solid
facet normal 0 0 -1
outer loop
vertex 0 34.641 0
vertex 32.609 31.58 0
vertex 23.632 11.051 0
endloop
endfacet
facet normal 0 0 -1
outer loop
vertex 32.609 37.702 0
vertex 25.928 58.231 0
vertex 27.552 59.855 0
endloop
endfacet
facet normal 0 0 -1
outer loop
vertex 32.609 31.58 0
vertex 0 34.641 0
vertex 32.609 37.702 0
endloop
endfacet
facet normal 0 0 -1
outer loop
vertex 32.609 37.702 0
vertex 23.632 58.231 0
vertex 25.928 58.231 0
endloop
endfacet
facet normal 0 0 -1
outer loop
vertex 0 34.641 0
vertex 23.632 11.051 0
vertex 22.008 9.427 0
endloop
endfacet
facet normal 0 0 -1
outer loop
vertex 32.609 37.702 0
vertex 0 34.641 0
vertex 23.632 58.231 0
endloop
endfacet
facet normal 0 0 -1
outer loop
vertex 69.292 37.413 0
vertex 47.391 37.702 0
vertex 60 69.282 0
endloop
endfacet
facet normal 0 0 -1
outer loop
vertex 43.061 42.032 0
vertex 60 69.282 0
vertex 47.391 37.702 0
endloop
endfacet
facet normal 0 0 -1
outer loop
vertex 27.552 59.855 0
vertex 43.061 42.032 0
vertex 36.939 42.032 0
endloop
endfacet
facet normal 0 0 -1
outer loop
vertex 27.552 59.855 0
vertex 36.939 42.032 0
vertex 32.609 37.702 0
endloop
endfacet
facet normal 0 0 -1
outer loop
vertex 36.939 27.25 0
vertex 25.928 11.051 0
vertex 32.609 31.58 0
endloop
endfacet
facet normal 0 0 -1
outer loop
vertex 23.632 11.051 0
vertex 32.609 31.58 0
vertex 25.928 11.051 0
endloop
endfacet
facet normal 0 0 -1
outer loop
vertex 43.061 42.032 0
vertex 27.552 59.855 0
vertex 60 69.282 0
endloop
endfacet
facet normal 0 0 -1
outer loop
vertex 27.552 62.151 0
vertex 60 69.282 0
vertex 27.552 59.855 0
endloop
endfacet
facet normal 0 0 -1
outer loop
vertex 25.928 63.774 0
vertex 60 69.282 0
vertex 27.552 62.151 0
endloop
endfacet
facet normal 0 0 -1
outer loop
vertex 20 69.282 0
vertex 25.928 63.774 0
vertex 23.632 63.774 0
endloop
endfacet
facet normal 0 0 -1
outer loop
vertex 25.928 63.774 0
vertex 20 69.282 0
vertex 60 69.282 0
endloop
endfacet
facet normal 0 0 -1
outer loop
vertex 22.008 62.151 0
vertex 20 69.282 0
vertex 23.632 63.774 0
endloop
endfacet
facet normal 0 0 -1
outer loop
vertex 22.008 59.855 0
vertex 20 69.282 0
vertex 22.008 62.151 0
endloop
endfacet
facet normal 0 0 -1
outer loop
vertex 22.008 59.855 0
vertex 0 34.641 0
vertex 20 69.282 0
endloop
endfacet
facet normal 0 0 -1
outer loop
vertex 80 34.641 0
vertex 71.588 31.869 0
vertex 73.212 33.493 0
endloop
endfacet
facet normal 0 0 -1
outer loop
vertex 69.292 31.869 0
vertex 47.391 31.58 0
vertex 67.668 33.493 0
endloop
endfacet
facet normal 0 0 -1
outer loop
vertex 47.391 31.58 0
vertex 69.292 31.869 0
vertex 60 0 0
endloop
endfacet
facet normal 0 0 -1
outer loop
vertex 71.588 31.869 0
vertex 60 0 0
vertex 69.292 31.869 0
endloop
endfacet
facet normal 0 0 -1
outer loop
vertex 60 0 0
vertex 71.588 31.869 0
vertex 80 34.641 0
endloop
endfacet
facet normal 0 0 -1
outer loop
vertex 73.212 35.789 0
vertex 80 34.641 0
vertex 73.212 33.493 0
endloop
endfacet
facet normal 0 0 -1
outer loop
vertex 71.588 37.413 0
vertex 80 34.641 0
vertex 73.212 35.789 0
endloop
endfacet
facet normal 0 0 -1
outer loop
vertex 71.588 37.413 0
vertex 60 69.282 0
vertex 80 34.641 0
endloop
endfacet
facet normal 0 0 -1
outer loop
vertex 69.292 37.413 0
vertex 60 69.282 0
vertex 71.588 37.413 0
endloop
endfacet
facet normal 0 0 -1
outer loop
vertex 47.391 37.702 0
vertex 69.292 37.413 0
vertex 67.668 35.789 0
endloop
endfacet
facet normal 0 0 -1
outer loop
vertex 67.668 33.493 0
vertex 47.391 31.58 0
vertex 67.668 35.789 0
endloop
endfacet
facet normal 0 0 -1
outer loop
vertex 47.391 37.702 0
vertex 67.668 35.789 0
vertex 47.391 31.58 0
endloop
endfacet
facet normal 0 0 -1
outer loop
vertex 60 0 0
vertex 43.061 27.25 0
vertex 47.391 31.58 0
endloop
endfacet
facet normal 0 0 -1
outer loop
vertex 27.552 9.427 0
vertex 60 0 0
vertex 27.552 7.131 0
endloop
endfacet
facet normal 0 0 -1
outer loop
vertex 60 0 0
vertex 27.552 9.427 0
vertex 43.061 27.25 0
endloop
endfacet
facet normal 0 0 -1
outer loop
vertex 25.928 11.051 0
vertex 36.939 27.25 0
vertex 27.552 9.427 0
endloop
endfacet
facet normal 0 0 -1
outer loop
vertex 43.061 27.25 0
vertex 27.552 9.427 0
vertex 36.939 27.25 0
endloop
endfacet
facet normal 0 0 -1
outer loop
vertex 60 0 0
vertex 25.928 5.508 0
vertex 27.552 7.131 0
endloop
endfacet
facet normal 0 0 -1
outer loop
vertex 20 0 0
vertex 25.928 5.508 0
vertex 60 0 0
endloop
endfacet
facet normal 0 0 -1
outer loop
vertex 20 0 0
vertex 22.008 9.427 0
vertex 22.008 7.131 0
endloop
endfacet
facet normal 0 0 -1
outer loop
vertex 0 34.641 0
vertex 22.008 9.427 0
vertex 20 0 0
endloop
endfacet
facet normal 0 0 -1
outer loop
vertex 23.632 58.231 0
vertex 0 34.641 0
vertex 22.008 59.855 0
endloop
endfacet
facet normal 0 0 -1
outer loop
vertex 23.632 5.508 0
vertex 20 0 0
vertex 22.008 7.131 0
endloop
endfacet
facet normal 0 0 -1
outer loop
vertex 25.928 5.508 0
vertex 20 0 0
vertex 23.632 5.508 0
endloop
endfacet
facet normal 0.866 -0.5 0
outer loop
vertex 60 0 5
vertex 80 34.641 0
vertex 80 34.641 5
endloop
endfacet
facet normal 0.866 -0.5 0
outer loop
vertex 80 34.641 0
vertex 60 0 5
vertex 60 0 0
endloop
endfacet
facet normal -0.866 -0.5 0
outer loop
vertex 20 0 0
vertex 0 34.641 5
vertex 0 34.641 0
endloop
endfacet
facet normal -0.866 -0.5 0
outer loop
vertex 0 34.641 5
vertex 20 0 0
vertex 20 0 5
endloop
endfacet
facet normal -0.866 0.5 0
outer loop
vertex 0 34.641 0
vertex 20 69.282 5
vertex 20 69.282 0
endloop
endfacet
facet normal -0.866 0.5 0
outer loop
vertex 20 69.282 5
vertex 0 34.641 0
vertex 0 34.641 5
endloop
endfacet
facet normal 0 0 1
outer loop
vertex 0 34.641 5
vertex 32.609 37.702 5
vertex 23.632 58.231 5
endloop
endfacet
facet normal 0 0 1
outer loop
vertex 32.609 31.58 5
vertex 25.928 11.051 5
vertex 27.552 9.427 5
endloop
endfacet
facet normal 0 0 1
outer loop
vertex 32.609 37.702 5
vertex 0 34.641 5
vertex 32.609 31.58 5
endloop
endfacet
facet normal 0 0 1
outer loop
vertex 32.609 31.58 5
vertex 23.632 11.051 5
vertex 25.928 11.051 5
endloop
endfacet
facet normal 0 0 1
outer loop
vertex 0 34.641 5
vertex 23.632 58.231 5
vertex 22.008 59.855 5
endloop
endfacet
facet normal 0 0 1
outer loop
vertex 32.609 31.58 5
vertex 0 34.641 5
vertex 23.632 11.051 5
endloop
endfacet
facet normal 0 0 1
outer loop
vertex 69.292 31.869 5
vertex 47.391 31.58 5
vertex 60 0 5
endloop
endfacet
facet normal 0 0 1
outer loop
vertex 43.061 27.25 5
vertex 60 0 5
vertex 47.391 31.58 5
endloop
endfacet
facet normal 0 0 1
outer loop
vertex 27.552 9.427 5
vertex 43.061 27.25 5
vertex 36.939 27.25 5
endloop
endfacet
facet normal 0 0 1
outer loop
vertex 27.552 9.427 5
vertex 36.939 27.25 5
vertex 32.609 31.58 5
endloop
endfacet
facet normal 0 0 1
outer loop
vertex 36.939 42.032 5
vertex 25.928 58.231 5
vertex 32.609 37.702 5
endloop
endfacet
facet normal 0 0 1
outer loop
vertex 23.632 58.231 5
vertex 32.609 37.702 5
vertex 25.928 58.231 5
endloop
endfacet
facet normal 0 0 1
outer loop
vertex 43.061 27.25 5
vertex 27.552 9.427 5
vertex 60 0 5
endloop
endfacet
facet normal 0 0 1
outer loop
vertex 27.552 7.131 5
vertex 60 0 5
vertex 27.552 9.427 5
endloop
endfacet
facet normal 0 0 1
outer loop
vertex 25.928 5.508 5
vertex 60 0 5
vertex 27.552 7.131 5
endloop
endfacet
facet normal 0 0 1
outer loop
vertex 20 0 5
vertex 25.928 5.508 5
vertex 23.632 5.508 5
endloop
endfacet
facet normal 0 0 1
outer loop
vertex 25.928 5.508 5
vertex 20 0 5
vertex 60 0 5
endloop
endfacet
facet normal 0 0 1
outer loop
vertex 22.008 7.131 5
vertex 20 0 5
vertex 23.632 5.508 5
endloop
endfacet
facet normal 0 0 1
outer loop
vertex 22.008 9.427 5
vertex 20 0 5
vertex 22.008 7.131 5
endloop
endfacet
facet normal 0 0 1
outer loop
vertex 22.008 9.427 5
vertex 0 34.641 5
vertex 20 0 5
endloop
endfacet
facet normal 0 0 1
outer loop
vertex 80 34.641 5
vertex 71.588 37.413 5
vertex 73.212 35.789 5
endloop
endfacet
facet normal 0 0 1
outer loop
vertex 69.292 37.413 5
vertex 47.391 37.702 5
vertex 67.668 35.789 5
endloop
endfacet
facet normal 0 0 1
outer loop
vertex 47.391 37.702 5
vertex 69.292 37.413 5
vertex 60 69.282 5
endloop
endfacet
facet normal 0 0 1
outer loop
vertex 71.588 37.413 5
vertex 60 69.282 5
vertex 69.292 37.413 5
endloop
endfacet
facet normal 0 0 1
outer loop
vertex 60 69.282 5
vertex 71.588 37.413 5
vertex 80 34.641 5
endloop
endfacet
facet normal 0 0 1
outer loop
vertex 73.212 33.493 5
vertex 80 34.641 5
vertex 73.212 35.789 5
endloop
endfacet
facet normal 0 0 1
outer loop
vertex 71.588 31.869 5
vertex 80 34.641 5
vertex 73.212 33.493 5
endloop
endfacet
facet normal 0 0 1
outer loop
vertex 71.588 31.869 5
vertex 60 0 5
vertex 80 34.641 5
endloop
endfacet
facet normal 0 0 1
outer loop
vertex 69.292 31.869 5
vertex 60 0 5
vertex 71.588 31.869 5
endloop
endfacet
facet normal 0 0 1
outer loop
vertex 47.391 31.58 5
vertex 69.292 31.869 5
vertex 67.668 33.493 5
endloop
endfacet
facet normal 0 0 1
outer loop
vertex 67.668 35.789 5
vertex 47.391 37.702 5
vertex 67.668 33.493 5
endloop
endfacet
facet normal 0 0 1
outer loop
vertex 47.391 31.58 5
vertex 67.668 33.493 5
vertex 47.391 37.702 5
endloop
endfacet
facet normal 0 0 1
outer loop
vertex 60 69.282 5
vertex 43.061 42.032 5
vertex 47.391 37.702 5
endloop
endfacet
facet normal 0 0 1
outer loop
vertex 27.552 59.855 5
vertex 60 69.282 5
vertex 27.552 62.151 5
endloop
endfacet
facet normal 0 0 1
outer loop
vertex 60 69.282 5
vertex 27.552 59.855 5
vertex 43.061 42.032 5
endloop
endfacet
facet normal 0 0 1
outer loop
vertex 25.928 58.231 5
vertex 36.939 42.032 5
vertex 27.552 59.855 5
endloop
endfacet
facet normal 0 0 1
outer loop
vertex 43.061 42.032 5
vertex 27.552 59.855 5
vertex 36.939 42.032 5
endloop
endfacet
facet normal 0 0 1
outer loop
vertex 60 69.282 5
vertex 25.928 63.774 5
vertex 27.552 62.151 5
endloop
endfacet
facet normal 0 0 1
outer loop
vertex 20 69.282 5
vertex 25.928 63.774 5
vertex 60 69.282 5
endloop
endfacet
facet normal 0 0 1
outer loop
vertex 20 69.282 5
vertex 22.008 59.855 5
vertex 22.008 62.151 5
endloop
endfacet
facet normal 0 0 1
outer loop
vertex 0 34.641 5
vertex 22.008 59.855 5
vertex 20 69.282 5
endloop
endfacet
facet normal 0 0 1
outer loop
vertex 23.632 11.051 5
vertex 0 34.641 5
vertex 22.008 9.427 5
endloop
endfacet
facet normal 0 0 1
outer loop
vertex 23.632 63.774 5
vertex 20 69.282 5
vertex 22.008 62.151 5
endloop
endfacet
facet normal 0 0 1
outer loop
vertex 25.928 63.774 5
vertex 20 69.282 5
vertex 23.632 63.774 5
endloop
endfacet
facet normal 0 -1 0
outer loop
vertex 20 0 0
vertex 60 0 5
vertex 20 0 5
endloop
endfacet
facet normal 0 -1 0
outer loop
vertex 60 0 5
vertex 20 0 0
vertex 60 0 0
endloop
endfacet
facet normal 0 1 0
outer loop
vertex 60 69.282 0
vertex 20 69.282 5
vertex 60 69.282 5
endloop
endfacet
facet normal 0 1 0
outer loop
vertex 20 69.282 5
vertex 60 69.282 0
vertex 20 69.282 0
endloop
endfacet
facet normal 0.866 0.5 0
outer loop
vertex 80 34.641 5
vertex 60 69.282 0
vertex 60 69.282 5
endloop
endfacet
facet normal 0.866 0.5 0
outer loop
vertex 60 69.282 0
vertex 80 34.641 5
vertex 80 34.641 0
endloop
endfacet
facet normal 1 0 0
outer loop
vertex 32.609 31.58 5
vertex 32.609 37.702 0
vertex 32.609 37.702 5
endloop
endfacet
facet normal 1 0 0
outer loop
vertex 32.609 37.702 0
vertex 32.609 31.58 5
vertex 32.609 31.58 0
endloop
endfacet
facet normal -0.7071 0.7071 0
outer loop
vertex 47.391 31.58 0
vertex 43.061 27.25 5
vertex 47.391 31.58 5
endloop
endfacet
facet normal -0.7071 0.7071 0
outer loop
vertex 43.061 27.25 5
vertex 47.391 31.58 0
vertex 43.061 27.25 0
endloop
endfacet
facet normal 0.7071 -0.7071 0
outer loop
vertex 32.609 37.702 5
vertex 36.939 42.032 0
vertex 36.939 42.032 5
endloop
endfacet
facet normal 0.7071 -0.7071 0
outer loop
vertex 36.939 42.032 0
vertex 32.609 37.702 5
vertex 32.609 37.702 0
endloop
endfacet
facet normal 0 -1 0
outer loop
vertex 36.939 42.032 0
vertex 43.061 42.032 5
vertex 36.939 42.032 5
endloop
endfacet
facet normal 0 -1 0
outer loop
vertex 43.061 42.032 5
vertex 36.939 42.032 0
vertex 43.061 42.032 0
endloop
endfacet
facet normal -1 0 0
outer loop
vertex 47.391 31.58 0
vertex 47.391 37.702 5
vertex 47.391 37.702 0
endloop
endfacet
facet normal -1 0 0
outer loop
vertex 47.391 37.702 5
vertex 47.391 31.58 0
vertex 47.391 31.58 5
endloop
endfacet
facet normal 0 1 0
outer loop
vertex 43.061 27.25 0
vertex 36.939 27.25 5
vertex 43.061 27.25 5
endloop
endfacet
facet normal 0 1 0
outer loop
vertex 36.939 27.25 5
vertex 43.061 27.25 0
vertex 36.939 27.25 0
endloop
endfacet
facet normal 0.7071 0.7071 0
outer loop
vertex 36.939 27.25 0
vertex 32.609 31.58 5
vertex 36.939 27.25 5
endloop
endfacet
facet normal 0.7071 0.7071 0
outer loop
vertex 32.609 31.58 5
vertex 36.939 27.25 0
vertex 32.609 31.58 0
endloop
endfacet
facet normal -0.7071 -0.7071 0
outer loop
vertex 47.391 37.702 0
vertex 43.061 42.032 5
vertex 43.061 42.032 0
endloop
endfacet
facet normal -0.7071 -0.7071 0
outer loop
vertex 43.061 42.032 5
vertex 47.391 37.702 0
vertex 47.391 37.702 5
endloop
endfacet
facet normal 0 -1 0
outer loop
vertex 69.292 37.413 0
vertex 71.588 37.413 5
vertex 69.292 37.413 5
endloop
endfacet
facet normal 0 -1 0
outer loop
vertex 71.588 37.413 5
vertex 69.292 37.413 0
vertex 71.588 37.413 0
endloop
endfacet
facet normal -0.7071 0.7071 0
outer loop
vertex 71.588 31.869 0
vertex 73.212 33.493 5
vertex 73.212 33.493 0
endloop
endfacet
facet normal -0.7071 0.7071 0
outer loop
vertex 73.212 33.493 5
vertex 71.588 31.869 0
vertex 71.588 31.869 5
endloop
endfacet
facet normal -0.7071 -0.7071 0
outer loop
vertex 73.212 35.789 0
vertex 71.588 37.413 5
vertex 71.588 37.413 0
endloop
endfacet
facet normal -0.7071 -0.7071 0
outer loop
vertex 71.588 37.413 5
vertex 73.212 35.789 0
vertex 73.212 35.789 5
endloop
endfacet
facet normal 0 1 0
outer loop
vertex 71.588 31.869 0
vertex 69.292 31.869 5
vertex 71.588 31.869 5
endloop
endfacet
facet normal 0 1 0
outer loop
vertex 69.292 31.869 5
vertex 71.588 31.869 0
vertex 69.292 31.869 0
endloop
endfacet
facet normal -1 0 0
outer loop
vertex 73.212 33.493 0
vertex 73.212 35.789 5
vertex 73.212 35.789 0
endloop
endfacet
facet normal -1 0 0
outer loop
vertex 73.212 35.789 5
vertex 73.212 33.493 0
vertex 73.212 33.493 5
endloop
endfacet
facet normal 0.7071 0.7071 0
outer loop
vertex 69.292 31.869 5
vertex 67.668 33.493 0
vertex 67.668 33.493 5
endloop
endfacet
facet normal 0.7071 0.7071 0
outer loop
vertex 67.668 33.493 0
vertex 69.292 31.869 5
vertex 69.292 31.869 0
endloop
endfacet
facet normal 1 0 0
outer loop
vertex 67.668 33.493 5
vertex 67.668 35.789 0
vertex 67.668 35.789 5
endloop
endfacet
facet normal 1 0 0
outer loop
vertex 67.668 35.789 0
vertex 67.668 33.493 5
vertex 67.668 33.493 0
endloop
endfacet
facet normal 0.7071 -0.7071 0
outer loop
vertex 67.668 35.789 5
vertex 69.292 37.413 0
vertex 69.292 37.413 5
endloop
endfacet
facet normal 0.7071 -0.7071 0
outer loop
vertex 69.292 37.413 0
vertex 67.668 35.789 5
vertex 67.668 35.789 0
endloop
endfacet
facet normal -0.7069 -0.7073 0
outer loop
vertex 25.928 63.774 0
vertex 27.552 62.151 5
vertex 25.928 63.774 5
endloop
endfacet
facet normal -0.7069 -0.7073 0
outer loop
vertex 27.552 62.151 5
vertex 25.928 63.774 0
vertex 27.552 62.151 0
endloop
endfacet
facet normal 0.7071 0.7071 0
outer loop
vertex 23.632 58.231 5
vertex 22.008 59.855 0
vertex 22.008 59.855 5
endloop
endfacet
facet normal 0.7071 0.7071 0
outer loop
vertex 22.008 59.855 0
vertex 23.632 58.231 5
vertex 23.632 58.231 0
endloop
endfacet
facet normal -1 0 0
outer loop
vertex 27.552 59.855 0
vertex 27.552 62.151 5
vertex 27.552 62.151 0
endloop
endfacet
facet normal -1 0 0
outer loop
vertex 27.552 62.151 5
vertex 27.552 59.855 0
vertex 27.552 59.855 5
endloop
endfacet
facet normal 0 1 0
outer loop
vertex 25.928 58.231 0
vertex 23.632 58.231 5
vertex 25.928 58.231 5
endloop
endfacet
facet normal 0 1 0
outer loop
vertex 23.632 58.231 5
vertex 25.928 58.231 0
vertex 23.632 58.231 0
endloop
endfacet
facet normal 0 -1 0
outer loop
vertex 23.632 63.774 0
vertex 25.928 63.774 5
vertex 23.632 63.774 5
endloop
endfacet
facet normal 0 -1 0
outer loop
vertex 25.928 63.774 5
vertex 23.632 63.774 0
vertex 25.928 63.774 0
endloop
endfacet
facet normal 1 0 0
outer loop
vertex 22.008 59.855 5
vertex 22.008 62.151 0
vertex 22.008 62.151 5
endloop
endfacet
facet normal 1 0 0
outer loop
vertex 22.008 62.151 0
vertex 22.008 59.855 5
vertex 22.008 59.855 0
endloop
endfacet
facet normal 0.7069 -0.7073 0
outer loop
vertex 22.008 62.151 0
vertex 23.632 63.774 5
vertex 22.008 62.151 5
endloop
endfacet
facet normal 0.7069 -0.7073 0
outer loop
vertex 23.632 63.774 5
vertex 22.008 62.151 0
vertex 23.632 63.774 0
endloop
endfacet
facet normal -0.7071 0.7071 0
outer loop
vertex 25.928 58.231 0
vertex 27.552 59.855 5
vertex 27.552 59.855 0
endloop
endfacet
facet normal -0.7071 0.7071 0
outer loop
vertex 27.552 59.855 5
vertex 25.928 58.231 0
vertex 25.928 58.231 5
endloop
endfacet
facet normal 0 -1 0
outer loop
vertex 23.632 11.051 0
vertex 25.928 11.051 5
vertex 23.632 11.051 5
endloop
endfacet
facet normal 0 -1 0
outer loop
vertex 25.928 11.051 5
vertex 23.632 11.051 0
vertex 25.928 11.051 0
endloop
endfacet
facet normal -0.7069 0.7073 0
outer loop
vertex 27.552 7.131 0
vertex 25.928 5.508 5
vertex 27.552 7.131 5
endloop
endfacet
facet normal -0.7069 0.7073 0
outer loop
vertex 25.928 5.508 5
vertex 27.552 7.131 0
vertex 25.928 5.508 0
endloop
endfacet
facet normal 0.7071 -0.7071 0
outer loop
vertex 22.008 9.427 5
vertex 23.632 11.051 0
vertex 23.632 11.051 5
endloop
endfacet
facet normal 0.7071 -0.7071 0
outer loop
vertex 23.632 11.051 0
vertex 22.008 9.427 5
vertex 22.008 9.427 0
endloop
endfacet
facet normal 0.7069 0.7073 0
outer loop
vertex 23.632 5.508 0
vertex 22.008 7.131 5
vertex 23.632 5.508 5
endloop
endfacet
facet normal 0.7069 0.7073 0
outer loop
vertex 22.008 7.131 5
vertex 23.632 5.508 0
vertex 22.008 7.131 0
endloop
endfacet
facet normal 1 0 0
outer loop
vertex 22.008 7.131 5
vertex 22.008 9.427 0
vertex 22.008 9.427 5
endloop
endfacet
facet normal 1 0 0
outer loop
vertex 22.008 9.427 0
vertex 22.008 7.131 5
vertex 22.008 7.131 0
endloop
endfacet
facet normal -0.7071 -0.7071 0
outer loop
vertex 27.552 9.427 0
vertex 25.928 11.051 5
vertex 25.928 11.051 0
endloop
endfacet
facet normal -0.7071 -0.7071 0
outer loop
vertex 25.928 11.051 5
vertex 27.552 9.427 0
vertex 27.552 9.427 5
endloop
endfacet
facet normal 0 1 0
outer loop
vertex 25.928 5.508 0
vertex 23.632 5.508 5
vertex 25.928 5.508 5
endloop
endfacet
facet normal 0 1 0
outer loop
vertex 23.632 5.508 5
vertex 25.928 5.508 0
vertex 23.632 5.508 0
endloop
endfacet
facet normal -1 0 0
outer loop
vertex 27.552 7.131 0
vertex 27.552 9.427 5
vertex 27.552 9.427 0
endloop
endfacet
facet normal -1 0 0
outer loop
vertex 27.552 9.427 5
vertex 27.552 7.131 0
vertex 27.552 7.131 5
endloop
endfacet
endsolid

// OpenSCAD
$fn = 32;

// ----------------------------------------------------------------------
// Polygon plate: 6-gon R40, 3 bolt windows
// ----------------------------------------------------------------------

// --- parameters (mm) ---
sides = 6;                // number of polygon sides
plate_r = 40;             // circumscribed radius of the polygon
bore_r = 8;               // centre bore radius
bolts = 3;                // number of bolt windows
ring_r = 30.44;           // bolt-circle radius
bolt_r = 3;               // bolt window radius
plate_t = 5;              // plate thickness, Z (extrusion height)
fit_tol = 0.1;            // declared fit tolerance (prompt contract)
free_tol = 0.3;           // declared free tolerance (prompt contract)

plate_d = 2 * plate_r;  // circumscribed diameter
bore_d = 2 * bore_r;  // centre bore diameter
bolt_d = 2 * bolt_r;  // bolt window diameter
ring_d = 2 * ring_r;  // bolt-circle diameter

profile = [[80, 34.641], [60, 69.282], [20, 69.282], [0, 34.641], [20, 0], [60, 0]];  // primary outline, 6 points, counter clockwise
void_1 = [[47.391, 37.702], [43.061, 42.032], [36.939, 42.032], [32.609, 37.702], [32.609, 31.58], [36.939, 27.25], [43.061, 27.25], [47.391, 31.58]];  // centre bore, 8 points
void_2 = [[73.212, 35.789], [71.588, 37.413], [69.292, 37.413], [67.668, 35.789], [67.668, 33.493], [69.292, 31.869], [71.588, 31.869], [73.212, 33.493]];  // bolt window 1, 8 points
void_3 = [[27.552, 62.151], [25.928, 63.774], [23.632, 63.774], [22.008, 62.151], [22.008, 59.855], [23.632, 58.231], [25.928, 58.231], [27.552, 59.855]];  // bolt window 2, 8 points
void_4 = [[27.552, 9.427], [25.928, 11.051], [23.632, 11.051], [22.008, 9.427], [22.008, 7.131], [23.632, 5.508], [25.928, 5.508], [27.552, 7.131]];  // bolt window 3, 8 points

// --- the one profile operation ---
difference() {
  linear_extrude(height = plate_t) polygon(points = profile);
  translate([0, 0, -1])
    linear_extrude(height = plate_t + 2) polygon(points = void_1);
  translate([0, 0, -1])
    linear_extrude(height = plate_t + 2) polygon(points = void_2);
  translate([0, 0, -1])
    linear_extrude(height = plate_t + 2) polygon(points = void_3);
  translate([0, 0, -1])
    linear_extrude(height = plate_t + 2) polygon(points = void_4);
}
